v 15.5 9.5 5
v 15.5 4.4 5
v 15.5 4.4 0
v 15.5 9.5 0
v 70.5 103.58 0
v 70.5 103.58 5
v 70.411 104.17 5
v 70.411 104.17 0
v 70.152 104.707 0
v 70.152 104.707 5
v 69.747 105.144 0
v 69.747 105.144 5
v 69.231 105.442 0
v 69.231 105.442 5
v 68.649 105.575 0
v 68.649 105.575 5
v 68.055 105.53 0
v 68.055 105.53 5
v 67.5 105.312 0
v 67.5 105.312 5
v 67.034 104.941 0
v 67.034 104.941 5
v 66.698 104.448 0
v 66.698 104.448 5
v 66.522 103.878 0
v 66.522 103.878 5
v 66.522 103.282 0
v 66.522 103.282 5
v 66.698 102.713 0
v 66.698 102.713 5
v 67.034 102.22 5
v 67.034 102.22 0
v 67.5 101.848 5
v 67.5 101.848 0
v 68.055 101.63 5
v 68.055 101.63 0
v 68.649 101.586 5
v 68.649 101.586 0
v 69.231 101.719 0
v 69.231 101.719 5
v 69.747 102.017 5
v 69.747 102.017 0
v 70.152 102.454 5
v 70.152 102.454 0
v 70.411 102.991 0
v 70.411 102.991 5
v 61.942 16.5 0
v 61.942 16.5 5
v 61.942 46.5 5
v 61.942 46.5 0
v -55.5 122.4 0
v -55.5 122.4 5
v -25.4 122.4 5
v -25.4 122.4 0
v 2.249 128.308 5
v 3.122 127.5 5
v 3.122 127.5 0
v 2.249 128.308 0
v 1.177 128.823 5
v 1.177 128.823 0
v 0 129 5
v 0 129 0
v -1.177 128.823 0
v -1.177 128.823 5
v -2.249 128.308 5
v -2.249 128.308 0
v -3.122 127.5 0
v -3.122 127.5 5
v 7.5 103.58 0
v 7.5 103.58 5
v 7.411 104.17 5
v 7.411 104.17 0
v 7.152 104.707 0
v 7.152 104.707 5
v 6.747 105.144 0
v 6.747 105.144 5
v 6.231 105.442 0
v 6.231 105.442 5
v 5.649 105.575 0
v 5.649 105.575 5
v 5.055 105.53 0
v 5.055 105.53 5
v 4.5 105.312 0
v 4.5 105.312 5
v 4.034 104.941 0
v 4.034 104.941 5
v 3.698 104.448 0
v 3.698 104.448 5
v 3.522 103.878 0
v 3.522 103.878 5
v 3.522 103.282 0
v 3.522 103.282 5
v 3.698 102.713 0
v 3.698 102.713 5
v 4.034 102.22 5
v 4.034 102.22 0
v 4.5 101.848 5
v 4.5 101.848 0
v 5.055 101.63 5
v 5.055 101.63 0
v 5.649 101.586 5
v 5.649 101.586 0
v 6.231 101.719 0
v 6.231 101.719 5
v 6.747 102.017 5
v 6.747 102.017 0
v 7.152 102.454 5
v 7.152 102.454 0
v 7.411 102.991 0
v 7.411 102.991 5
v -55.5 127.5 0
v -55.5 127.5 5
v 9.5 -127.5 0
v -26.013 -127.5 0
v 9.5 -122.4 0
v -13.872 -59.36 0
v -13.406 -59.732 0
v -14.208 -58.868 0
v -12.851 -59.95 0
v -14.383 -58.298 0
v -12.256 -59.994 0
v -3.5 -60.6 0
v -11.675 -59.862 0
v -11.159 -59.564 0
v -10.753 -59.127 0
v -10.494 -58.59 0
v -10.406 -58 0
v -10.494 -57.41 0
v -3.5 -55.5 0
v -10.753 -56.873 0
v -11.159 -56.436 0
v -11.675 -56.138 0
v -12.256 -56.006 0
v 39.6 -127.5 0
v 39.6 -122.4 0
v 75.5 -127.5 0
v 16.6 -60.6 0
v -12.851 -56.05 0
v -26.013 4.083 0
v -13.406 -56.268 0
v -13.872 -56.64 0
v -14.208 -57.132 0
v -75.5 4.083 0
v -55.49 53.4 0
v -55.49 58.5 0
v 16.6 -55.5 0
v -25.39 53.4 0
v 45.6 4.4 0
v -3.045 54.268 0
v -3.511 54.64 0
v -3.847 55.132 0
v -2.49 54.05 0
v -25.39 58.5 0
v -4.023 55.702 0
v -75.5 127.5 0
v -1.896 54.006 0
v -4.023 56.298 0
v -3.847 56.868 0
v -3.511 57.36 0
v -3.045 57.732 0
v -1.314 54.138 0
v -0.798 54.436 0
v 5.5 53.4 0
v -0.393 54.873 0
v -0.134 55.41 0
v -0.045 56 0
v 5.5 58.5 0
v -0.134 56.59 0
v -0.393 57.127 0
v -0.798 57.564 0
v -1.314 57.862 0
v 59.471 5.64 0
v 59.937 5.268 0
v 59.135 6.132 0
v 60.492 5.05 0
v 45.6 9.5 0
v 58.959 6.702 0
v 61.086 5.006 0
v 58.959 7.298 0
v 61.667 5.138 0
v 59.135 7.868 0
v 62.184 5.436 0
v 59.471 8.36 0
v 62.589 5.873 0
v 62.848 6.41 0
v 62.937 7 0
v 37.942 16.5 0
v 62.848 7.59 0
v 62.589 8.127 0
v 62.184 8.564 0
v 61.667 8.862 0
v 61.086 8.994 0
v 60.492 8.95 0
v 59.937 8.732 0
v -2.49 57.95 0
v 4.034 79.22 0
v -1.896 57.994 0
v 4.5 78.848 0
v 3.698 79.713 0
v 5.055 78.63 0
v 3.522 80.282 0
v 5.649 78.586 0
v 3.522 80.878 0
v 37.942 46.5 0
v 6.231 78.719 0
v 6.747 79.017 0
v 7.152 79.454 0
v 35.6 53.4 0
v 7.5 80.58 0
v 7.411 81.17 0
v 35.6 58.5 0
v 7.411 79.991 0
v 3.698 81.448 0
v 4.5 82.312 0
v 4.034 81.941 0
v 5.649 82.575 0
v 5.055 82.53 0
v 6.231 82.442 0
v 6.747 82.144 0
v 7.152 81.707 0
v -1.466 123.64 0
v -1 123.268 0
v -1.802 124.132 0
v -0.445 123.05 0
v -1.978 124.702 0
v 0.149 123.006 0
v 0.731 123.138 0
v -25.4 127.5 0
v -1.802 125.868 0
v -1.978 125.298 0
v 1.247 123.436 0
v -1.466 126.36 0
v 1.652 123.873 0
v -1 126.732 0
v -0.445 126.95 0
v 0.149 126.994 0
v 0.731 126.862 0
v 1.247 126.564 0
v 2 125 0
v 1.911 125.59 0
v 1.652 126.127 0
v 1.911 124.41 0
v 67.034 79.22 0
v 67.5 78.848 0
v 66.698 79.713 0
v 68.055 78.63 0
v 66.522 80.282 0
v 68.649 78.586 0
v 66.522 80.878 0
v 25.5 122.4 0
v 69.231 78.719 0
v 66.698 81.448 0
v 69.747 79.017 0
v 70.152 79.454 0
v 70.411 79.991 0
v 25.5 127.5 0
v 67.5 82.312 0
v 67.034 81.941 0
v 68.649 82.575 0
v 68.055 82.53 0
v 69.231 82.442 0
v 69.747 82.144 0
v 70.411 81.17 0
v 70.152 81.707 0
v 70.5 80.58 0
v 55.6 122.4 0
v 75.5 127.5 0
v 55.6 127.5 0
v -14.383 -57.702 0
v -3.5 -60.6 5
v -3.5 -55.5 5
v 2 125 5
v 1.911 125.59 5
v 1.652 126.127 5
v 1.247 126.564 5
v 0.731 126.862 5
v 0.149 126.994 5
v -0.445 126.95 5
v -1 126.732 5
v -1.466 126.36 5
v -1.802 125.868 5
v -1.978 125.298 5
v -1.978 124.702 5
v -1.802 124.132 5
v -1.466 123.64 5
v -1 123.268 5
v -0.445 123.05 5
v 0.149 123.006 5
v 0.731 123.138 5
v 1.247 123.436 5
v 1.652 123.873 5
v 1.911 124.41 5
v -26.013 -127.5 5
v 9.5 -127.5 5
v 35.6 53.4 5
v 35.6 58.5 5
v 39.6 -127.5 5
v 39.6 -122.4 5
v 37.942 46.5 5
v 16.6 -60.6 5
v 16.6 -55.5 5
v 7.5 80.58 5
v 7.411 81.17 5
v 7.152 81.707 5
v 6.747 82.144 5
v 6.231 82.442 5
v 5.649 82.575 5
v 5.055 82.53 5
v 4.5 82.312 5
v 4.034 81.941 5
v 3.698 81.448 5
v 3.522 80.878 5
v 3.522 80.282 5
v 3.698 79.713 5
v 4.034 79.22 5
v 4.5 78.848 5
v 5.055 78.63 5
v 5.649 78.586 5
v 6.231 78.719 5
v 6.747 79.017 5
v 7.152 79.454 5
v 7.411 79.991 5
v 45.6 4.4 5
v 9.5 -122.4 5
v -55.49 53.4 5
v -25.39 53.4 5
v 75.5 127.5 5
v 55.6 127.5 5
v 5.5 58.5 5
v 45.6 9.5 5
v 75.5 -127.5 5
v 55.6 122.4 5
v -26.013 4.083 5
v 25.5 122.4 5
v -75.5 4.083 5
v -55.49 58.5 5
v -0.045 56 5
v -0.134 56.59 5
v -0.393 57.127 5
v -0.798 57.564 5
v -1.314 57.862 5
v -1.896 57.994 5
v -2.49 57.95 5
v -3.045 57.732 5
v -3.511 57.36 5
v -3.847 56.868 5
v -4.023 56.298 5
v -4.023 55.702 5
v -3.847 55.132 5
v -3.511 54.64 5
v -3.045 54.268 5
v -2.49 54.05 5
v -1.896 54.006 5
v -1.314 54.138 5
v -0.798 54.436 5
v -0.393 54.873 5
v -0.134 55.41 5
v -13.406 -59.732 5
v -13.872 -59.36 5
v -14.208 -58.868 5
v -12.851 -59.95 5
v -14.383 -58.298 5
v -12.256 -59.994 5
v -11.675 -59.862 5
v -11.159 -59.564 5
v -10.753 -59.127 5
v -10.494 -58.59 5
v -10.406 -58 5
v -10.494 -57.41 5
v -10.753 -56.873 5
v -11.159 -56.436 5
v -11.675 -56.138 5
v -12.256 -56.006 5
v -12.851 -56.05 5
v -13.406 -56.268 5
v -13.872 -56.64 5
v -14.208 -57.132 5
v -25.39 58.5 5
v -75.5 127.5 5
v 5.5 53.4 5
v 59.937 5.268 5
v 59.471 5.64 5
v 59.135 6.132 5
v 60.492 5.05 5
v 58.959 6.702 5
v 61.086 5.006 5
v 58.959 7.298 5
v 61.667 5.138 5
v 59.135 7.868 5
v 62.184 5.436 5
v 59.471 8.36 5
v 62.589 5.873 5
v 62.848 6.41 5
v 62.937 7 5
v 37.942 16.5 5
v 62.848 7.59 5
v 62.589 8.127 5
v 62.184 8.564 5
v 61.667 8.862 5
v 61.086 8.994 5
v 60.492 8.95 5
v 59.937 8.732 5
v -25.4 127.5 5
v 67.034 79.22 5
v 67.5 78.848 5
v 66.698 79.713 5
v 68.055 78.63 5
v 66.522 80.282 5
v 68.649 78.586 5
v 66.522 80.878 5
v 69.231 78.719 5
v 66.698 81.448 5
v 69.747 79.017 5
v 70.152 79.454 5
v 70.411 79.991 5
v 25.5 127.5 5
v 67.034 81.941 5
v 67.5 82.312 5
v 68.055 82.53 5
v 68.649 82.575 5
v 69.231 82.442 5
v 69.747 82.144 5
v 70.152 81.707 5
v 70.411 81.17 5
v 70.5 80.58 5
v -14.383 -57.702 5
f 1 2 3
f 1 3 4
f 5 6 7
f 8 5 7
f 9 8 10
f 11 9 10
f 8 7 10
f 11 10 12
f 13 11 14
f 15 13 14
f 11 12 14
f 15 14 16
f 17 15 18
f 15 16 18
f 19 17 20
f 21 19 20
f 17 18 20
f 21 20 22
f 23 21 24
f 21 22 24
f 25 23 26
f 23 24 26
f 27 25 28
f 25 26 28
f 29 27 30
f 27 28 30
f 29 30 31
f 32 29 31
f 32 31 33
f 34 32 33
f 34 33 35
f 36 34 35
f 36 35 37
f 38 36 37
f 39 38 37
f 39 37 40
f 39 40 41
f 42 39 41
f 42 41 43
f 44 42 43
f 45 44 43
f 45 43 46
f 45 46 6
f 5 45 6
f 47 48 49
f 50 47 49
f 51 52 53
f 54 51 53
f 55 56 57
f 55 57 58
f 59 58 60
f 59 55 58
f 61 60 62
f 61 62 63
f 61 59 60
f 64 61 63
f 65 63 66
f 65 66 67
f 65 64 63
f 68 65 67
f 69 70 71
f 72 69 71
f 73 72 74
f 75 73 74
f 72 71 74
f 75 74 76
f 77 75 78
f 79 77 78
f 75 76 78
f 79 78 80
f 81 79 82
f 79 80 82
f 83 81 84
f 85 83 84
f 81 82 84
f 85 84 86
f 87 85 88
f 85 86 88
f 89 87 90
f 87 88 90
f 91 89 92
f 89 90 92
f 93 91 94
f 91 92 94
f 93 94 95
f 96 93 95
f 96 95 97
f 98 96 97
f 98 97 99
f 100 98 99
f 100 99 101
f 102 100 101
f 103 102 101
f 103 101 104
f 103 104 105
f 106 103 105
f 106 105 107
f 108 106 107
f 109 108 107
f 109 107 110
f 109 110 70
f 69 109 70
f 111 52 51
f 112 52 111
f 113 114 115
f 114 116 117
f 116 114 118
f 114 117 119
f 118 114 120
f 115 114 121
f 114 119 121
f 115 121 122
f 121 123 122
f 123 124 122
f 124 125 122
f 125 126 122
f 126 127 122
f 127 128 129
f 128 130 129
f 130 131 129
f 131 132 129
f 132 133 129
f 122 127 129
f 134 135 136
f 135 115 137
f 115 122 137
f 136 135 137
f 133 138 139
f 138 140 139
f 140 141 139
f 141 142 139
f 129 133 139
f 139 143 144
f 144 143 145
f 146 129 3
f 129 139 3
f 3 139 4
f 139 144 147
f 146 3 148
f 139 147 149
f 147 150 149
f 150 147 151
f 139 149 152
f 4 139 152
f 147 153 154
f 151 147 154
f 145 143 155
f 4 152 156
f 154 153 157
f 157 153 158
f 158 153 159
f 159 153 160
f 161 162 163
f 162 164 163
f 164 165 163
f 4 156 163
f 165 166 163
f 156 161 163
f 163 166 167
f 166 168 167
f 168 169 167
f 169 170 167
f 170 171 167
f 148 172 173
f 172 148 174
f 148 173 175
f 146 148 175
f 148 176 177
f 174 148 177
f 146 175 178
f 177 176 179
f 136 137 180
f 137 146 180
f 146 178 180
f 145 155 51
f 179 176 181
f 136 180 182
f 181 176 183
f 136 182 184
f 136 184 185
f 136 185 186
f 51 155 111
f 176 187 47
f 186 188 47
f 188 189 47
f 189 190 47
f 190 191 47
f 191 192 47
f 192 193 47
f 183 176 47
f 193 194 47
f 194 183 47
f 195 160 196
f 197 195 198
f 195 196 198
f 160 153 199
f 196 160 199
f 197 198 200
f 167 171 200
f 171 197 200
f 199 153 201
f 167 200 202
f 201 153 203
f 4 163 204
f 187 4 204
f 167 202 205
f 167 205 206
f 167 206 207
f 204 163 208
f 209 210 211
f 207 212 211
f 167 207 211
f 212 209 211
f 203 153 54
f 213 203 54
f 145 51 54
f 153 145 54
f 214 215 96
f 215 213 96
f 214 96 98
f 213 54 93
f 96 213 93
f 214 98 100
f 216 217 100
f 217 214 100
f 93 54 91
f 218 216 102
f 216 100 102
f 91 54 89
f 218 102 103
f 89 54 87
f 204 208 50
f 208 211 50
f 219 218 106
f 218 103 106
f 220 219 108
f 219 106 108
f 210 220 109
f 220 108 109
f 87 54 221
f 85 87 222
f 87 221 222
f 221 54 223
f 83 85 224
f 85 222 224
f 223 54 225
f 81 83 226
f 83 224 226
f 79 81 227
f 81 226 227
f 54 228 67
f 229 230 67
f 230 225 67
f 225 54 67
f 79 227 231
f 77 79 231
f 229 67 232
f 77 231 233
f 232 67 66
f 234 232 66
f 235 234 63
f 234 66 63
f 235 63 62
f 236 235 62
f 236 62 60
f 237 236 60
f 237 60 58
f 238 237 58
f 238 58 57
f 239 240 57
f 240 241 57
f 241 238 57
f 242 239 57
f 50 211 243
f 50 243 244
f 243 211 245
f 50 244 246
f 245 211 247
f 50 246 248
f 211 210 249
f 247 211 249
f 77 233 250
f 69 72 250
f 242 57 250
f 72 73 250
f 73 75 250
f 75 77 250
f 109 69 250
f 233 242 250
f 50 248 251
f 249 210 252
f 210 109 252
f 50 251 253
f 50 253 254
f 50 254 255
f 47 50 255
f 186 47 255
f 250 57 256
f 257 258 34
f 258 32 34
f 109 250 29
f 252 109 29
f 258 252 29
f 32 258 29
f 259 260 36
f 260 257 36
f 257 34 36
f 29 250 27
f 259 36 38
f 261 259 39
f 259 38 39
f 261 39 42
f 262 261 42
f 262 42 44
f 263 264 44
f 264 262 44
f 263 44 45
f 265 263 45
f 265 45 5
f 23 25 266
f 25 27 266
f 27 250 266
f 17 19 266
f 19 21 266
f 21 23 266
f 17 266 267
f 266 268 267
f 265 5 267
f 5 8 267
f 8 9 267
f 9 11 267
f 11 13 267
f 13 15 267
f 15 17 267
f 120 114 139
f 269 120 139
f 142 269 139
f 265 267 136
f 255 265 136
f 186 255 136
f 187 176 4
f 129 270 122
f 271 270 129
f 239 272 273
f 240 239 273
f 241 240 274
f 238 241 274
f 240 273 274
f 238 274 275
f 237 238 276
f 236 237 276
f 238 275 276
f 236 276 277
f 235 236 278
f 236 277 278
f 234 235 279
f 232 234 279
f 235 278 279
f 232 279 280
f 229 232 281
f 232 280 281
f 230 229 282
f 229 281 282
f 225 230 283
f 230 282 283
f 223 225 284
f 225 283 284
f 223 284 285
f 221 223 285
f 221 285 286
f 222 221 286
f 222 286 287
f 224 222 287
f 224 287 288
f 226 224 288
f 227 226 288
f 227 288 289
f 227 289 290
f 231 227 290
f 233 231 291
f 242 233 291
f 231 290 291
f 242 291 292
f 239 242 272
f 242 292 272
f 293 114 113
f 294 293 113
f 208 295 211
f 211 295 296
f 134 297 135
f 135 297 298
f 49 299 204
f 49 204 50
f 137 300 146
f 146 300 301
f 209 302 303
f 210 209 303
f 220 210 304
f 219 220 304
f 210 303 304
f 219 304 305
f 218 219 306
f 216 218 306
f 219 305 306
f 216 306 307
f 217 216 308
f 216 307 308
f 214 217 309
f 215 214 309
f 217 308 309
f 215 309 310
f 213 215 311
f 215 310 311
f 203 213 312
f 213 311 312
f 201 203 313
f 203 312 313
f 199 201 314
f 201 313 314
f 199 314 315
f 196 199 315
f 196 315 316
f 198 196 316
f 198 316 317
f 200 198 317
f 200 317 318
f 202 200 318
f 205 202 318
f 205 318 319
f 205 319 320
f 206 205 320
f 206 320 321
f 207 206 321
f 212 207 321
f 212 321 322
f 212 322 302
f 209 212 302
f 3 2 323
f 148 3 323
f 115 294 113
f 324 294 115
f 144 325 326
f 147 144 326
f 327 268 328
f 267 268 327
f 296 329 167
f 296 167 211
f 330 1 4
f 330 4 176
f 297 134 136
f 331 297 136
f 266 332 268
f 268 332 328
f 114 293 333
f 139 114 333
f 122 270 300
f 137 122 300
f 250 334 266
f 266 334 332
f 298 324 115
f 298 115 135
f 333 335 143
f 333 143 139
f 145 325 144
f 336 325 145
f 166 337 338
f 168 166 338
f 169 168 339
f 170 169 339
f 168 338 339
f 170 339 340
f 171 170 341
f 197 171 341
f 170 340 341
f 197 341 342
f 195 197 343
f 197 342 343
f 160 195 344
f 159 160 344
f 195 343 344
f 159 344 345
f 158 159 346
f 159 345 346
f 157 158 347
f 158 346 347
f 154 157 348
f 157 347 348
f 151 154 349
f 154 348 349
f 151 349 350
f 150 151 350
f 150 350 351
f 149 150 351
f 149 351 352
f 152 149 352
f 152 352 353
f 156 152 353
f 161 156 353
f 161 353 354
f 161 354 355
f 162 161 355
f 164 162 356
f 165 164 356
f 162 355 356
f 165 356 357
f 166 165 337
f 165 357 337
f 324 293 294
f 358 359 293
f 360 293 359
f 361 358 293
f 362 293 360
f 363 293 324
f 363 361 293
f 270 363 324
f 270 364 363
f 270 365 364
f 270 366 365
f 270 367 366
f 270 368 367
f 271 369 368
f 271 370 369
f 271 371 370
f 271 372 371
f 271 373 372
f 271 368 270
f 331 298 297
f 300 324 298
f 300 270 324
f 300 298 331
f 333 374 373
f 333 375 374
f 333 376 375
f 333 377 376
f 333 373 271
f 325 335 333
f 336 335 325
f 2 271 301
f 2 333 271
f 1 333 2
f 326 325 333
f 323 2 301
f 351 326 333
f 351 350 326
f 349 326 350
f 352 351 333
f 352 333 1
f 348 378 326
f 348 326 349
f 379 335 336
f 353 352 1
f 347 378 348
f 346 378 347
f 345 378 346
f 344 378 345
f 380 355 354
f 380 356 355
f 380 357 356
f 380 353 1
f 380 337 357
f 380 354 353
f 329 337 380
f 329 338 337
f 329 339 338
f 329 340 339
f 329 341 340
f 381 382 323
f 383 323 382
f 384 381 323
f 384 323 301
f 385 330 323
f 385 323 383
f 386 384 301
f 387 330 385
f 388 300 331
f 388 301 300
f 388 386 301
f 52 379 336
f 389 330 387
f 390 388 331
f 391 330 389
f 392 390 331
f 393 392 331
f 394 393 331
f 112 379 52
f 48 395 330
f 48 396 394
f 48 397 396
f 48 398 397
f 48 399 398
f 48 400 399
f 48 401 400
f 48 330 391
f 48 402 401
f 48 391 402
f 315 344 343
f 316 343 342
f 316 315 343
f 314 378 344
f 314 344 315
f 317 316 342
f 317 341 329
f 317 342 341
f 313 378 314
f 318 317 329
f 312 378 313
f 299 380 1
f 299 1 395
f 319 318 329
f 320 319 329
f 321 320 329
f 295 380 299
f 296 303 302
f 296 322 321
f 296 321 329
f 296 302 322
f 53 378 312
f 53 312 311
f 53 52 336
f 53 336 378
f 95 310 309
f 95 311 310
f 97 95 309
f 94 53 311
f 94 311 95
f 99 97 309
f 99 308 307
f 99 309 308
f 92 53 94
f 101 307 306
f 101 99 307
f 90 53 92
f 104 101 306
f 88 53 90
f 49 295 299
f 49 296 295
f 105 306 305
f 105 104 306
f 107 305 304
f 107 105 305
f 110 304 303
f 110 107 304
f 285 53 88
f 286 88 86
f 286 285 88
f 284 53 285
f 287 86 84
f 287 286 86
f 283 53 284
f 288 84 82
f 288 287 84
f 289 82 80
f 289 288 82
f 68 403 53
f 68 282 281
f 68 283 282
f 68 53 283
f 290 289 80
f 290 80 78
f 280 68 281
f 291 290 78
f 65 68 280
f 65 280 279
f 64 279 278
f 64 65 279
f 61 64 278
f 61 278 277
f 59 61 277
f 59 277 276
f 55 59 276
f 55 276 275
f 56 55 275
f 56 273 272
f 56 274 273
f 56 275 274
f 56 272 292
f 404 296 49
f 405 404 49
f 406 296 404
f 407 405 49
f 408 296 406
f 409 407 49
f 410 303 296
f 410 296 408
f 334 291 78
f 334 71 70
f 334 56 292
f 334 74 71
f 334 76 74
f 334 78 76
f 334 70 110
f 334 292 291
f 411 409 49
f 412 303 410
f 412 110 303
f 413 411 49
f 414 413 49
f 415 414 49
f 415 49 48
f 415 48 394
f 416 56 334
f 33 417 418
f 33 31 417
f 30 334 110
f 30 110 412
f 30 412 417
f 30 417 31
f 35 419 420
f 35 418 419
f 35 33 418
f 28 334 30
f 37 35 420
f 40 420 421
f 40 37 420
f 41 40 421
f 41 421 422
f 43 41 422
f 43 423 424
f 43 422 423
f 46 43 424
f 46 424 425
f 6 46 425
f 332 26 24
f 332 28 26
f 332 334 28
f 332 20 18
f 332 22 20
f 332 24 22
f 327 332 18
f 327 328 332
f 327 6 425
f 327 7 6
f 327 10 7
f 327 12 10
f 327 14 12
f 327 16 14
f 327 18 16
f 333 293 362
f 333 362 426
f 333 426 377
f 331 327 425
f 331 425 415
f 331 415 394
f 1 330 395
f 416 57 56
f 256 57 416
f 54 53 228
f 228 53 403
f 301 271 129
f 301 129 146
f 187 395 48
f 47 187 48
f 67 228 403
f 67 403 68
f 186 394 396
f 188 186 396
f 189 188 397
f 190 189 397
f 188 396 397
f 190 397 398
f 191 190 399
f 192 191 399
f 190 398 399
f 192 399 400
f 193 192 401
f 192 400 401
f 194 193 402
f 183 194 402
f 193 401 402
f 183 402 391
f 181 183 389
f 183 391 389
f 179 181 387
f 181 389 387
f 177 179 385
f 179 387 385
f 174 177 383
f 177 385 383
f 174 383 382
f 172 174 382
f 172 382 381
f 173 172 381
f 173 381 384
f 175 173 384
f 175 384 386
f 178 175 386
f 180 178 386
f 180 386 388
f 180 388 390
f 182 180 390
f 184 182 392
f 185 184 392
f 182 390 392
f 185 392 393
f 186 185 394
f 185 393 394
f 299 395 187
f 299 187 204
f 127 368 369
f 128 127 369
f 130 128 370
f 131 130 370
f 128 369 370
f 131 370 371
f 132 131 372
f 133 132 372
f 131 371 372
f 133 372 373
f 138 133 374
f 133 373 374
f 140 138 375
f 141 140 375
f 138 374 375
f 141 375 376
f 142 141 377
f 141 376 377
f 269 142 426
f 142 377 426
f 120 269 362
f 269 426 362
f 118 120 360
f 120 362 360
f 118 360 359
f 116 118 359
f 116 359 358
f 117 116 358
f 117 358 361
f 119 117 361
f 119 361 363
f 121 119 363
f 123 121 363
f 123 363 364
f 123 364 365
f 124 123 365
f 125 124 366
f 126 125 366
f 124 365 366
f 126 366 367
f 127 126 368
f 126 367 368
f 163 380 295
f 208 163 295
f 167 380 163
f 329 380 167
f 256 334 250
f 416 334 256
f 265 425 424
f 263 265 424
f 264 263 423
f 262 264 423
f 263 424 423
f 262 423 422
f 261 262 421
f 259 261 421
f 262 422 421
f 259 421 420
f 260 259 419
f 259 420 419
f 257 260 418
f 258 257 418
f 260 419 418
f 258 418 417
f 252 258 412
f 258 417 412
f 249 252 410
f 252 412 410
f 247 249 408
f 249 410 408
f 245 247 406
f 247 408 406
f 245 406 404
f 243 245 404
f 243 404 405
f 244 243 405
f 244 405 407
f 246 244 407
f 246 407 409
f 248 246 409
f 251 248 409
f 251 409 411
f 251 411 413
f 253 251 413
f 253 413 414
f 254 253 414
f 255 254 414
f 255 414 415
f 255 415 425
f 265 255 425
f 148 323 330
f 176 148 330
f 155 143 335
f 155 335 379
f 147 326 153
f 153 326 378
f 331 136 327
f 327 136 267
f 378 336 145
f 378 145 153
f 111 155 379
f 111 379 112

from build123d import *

# Parameters (mm, degrees)
SKETCH1_W           = 151
SKETCH1_H           = 255
BOSS_EXTRUDE1_DEPTH = 5
SKETCH2_W           = 49.486524855
SKETCH2_H           = 131.582895272
CUT_EXTRUDE1_DEPTH  = 5
SKETCH3_W           = 30.1
SKETCH3_H           = 5.1
SKETCH3_W_2         = 20.1
CUT_EXTRUDE2_DEPTH  = 5
SKETCH4_R           = 2
CUT_EXTRUDE3_DEPTH  = 5
SKETCH5_R           = 4
SKETCH5_R_2         = 2
BOSS_EXTRUDE2_DEPTH = 5
SKETCH6_W           = 24
SKETCH6_H           = 30
CUT_EXTRUDE4_DEPTH  = 5
SKETCH7_R           = 2
CUT_EXTRUDE5_DEPTH  = 10


with BuildPart() as part:
    # Sketch1 → Boss-Extrude1 (new body)
    with BuildSketch(Plane.XY):
        Rectangle(SKETCH1_W, SKETCH1_H)
    extrude(amount=BOSS_EXTRUDE1_DEPTH)

    # Sketch2 → Cut-Extrude1 (cut)
    with BuildSketch(Plane.XY.offset(5)):
        with Locations((-50.756737573, -61.708552364)):
            Rectangle(SKETCH2_W, SKETCH2_H)
    extrude(amount=-CUT_EXTRUDE1_DEPTH, mode=Mode.SUBTRACT)

    # Sketch3 → Cut-Extrude2 (cut)
    with BuildSketch(Plane.XY.offset(5)):
        with Locations((-40.45, 124.95)):
            Rectangle(SKETCH3_W, SKETCH3_H)
        with Locations((40.55, 124.95)):
            Rectangle(SKETCH3_W, SKETCH3_H)
        with Locations((-40.440248728, 55.95)):
            Rectangle(SKETCH3_W, SKETCH3_H)
        with Locations((20.55, 55.95)):
            Rectangle(SKETCH3_W, SKETCH3_H)
        with Locations((30.55, 6.95)):
            Rectangle(SKETCH3_W, SKETCH3_H)
        with Locations((6.55, -58.05)):
            Rectangle(SKETCH3_W_2, SKETCH3_H)
        with Locations((24.55, -124.95)):
            Rectangle(SKETCH3_W, SKETCH3_H)
    extrude(amount=-CUT_EXTRUDE2_DEPTH, mode=Mode.SUBTRACT)

    # Sketch4 → Cut-Extrude3 (cut)
    with BuildSketch(Plane.XY.offset(5)):
        with Locations((0, 125)):
            Circle(SKETCH4_R)
        with Locations((-2.045010771, 56)):
            Circle(SKETCH4_R)
        with Locations((60.936739195, 7)):
            Circle(SKETCH4_R)
        with Locations((-12.405611853, -58)):
            Circle(SKETCH4_R)
    extrude(amount=-CUT_EXTRUDE3_DEPTH, mode=Mode.SUBTRACT)

    # Sketch5 → Boss-Extrude2 (add)
    with BuildSketch(Plane.XY.offset(5)):
        with Locations((0, 125)):
            Circle(SKETCH5_R)
        with Locations((0, 125)):
            Circle(SKETCH5_R_2, mode=Mode.SUBTRACT)
    extrude(amount=-BOSS_EXTRUDE2_DEPTH)

    # Sketch6 → Cut-Extrude4 (cut)
    with BuildSketch(Plane.XY.offset(5)):
        with Locations((49.941975166, 31.5)):
            Rectangle(SKETCH6_W, SKETCH6_H)
    extrude(amount=-CUT_EXTRUDE4_DEPTH, mode=Mode.SUBTRACT)

    # Sketch7 → Cut-Extrude5 (cut)
    with BuildSketch(Plane.XY.offset(5)):
        with Locations((68.5, 103.580315126)):
            Circle(SKETCH7_R)
        with Locations((5.5, 80.580315126)):
            Circle(SKETCH7_R)
        with Locations((5.5, 103.580315126)):
            Circle(SKETCH7_R)
        with Locations((68.5, 80.580315126)):
            Circle(SKETCH7_R)
    extrude(amount=-CUT_EXTRUDE5_DEPTH, mode=Mode.SUBTRACT)


solid = part.part
